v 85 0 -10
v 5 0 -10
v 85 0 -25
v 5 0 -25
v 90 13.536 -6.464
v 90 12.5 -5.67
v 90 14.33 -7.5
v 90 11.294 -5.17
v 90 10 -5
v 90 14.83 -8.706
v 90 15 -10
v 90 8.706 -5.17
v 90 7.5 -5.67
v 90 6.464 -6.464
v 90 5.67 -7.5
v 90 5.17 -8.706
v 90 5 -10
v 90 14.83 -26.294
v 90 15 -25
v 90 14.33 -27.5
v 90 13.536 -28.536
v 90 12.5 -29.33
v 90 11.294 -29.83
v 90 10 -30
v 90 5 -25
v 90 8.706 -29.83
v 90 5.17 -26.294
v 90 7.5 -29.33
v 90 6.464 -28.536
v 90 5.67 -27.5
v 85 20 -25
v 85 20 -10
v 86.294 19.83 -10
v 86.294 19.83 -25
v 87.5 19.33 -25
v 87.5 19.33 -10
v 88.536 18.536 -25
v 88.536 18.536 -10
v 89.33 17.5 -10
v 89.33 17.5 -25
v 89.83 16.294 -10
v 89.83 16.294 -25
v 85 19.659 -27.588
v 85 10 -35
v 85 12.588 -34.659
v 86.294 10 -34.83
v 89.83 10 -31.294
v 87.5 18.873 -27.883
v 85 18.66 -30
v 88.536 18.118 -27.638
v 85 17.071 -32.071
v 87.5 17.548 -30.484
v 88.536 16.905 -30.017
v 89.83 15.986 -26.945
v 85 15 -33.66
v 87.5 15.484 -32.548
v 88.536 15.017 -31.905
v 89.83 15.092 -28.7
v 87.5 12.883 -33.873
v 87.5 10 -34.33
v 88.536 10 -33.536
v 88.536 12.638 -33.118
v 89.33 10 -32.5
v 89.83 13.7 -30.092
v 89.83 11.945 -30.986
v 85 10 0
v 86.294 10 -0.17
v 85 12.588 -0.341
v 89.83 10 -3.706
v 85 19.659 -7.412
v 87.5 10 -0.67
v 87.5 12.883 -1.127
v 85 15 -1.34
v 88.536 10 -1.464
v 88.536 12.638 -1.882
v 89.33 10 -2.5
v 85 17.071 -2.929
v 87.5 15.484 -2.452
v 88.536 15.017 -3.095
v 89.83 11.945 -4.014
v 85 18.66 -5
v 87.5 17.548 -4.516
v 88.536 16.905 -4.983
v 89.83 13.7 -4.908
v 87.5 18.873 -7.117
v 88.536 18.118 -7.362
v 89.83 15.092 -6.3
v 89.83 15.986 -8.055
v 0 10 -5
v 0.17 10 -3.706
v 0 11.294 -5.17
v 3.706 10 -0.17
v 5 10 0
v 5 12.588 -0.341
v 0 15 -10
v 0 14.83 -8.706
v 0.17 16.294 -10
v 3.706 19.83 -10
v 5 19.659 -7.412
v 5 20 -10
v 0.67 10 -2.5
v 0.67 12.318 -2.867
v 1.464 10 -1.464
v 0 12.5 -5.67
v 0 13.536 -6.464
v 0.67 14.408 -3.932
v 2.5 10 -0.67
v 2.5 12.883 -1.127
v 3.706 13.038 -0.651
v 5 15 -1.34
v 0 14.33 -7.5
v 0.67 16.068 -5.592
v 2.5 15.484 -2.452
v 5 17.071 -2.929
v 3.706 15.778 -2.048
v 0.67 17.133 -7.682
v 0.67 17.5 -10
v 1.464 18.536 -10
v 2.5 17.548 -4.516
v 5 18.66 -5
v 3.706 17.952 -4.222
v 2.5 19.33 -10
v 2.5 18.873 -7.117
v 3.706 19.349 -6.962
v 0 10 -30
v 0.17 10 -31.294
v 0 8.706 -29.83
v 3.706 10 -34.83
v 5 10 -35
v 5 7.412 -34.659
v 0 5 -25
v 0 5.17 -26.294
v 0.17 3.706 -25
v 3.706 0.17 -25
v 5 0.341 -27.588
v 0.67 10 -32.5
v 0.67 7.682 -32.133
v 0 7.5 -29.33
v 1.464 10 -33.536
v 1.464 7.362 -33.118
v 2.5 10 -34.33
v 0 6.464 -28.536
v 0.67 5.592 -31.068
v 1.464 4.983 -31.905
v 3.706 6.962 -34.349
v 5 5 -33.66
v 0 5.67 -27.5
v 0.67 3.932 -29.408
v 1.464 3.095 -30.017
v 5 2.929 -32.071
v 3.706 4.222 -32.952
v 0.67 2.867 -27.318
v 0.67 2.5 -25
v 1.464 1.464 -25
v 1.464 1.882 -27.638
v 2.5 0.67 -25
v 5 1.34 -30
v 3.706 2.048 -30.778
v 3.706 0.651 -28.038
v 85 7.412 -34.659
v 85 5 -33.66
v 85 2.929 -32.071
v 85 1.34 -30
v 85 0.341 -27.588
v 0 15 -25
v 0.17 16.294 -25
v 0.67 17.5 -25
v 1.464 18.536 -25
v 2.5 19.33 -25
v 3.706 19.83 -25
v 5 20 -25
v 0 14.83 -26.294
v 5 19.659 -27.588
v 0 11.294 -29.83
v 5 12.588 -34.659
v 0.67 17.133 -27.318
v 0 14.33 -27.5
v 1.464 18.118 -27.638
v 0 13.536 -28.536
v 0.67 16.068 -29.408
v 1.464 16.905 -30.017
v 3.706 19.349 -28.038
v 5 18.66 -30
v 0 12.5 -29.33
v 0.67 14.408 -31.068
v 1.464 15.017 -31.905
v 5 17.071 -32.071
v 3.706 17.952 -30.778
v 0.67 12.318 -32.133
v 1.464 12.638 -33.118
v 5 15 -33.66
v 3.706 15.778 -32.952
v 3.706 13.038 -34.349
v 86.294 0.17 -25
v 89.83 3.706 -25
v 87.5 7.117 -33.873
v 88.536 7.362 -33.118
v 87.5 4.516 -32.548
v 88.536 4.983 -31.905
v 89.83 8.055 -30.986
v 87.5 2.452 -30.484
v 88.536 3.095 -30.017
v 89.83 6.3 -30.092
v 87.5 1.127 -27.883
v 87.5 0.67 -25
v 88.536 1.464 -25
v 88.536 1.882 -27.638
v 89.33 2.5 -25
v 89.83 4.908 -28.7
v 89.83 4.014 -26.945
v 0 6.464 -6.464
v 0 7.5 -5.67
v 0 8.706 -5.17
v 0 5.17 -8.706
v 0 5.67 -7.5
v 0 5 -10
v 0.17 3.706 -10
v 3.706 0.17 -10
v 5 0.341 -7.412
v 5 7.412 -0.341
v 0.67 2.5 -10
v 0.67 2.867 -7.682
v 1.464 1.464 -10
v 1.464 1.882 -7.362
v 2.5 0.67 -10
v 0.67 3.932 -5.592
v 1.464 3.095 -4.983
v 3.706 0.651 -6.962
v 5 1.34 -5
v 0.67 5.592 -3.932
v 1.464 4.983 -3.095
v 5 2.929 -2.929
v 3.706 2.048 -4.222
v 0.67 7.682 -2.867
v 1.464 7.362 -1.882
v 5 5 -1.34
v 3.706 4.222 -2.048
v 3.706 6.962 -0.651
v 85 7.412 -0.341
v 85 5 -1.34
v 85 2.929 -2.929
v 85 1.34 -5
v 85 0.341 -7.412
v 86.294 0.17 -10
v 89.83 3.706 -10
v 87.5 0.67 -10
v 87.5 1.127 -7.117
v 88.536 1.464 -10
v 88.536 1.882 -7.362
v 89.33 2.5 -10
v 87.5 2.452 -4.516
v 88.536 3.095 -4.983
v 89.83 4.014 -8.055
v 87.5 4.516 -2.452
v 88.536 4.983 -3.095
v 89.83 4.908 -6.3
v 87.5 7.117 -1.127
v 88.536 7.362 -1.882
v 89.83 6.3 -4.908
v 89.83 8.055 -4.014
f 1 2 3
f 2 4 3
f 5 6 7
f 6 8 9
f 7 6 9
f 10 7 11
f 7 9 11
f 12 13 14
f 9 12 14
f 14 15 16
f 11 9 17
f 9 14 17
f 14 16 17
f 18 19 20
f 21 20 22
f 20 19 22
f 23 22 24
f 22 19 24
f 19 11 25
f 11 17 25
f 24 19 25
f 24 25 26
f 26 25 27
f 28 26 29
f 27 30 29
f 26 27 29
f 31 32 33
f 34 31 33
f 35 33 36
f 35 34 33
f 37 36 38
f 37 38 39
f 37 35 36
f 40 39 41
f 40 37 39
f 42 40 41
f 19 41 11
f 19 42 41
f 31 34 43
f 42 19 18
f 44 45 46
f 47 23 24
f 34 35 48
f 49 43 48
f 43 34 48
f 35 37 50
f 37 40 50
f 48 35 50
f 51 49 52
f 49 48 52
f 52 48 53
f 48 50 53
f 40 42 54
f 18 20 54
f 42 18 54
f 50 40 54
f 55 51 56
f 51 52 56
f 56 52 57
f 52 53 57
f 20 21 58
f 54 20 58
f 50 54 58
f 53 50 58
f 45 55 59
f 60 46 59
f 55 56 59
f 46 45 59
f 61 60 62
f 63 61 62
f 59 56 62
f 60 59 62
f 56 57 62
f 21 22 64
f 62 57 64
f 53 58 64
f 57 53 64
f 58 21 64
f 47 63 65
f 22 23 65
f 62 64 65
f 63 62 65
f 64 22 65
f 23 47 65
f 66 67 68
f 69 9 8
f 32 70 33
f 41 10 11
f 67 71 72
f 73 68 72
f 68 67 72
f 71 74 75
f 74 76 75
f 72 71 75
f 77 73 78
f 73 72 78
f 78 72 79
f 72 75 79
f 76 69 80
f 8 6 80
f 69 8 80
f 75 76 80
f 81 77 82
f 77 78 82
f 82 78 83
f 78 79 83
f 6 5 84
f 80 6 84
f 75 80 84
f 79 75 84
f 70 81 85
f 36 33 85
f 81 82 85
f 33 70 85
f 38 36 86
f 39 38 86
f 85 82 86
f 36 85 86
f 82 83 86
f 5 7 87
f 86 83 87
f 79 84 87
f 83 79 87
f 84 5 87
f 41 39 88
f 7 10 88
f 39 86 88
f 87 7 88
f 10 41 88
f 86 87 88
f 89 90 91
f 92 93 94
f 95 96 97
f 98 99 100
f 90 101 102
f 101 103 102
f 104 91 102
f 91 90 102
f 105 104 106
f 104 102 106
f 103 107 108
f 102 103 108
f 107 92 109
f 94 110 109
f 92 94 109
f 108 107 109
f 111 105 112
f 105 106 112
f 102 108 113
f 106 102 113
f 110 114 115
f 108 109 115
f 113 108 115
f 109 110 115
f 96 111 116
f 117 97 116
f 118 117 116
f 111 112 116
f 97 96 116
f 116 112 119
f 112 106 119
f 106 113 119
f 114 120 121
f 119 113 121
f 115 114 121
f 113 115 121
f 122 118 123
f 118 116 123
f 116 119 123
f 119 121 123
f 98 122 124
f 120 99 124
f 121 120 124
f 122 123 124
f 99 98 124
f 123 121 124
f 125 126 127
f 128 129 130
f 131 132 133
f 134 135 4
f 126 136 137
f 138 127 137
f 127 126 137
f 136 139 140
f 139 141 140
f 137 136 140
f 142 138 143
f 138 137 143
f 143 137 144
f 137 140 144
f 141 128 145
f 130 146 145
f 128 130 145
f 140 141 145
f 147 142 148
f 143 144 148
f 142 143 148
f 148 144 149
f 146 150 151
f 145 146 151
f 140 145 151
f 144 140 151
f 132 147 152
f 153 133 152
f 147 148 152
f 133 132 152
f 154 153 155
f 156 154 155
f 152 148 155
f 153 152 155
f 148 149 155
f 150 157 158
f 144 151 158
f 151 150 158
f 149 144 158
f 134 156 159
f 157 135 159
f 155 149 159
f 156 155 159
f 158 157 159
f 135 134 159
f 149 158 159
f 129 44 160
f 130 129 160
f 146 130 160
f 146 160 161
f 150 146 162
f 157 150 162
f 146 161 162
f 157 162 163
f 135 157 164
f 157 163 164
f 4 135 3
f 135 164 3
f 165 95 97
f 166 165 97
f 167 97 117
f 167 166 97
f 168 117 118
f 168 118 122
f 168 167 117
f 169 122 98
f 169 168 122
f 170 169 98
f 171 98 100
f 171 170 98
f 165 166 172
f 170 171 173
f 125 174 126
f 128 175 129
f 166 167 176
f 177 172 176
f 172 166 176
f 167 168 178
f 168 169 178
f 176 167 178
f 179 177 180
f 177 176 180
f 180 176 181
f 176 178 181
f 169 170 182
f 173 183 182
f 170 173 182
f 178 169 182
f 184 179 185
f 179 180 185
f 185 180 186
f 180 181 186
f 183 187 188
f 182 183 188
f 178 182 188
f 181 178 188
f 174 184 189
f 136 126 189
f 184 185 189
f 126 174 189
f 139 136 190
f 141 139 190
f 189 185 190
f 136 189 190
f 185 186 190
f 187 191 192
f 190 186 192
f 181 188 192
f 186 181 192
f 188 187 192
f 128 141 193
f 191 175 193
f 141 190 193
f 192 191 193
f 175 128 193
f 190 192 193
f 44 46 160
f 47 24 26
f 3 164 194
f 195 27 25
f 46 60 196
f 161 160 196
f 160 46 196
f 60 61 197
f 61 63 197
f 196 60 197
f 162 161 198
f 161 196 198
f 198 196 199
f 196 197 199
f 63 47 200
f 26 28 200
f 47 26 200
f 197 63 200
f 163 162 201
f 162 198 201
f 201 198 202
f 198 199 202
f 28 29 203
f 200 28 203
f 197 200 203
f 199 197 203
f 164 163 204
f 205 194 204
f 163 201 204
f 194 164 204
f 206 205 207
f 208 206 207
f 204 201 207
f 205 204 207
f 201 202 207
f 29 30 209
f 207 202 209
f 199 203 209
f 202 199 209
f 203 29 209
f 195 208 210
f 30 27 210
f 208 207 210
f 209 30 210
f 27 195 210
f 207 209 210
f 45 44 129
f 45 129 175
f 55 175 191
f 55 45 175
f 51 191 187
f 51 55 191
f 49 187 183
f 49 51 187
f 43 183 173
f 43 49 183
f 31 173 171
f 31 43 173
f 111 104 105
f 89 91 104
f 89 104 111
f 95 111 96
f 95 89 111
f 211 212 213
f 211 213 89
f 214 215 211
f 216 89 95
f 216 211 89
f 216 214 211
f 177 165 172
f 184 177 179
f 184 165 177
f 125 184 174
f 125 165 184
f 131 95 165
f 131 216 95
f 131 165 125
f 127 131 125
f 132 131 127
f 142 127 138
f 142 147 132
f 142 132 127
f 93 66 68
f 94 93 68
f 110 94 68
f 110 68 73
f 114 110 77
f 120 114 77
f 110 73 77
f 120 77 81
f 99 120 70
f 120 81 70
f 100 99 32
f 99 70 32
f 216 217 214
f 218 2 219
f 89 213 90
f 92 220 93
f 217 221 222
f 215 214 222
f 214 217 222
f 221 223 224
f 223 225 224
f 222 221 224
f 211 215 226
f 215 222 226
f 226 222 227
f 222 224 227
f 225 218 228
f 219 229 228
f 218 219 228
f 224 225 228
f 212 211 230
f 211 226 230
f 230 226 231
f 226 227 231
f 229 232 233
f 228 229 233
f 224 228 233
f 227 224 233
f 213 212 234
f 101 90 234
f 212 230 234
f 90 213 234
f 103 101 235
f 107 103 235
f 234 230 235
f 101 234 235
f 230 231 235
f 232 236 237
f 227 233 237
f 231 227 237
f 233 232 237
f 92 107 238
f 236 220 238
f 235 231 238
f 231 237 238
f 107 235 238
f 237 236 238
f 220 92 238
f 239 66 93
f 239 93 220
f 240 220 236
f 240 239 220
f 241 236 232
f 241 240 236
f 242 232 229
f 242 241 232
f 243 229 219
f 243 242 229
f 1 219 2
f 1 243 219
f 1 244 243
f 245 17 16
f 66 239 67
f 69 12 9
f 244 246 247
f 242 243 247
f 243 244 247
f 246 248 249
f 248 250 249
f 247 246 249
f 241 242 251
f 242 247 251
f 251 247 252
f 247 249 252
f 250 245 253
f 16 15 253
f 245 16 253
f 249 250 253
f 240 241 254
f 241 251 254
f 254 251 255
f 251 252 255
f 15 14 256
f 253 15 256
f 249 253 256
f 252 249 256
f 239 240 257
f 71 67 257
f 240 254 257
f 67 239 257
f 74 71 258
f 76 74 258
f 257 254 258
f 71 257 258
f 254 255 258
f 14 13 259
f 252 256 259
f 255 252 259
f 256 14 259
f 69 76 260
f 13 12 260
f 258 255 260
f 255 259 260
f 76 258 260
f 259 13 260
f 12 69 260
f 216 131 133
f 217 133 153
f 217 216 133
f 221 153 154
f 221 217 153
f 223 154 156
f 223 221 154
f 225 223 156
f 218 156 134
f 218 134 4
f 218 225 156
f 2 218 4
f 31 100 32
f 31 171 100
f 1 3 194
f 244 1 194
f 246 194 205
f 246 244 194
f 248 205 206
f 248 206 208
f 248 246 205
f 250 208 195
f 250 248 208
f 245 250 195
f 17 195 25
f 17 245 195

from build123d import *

# Parameters (mm, degrees)
SKETCH1_W           = 90
SKETCH1_H           = 35
BOSS_EXTRUDE1_DEPTH = 20
FILLET1_R           = 10
FILLET2_R           = 5


with BuildPart() as part:
    # Sketch1 → Boss-Extrude1 (new body)
    with BuildSketch(Plane(origin=(0, 0, 0), x_dir=(1, 0, 0), z_dir=(0, 1, 0))):
        with Locations((45, 17.5)):
            Rectangle(SKETCH1_W, SKETCH1_H)
    extrude(amount=BOSS_EXTRUDE1_DEPTH)

    # Fillet1
    fillet1_edges = [part.edges().sort_by_distance(p)[0] for p in [
        (45, 20, -35),
        (45, 0, -35),
        (45, 0, 0),
        (45, 20, 0),
    ]]
    fillet(fillet1_edges, radius=FILLET1_R - 0.0001)  # a hair under: the kernel refuses the full size

    # Fillet2
    fillet2_edges = [part.edges().sort_by_distance(p)[0] for p in [
        (0, 20, -17.5),
        (90, 20, -17.5),
        (0, 0, -17.5),
        (0, 17.071097101, -2.928902899),
        (0, 2.928902899, -2.928902899),
        (0, 2.928902899, -32.071097101),
        (0, 17.071097101, -32.071097101),
        (90, 0, -17.5),
        (90, 17.071097101, -2.928902899),
        (90, 2.928902899, -2.928902899),
        (90, 2.928902899, -32.071097101),
        (90, 17.071097101, -32.071097101),
    ]]
    fillet(fillet2_edges, radius=FILLET2_R)


solid = part.part
